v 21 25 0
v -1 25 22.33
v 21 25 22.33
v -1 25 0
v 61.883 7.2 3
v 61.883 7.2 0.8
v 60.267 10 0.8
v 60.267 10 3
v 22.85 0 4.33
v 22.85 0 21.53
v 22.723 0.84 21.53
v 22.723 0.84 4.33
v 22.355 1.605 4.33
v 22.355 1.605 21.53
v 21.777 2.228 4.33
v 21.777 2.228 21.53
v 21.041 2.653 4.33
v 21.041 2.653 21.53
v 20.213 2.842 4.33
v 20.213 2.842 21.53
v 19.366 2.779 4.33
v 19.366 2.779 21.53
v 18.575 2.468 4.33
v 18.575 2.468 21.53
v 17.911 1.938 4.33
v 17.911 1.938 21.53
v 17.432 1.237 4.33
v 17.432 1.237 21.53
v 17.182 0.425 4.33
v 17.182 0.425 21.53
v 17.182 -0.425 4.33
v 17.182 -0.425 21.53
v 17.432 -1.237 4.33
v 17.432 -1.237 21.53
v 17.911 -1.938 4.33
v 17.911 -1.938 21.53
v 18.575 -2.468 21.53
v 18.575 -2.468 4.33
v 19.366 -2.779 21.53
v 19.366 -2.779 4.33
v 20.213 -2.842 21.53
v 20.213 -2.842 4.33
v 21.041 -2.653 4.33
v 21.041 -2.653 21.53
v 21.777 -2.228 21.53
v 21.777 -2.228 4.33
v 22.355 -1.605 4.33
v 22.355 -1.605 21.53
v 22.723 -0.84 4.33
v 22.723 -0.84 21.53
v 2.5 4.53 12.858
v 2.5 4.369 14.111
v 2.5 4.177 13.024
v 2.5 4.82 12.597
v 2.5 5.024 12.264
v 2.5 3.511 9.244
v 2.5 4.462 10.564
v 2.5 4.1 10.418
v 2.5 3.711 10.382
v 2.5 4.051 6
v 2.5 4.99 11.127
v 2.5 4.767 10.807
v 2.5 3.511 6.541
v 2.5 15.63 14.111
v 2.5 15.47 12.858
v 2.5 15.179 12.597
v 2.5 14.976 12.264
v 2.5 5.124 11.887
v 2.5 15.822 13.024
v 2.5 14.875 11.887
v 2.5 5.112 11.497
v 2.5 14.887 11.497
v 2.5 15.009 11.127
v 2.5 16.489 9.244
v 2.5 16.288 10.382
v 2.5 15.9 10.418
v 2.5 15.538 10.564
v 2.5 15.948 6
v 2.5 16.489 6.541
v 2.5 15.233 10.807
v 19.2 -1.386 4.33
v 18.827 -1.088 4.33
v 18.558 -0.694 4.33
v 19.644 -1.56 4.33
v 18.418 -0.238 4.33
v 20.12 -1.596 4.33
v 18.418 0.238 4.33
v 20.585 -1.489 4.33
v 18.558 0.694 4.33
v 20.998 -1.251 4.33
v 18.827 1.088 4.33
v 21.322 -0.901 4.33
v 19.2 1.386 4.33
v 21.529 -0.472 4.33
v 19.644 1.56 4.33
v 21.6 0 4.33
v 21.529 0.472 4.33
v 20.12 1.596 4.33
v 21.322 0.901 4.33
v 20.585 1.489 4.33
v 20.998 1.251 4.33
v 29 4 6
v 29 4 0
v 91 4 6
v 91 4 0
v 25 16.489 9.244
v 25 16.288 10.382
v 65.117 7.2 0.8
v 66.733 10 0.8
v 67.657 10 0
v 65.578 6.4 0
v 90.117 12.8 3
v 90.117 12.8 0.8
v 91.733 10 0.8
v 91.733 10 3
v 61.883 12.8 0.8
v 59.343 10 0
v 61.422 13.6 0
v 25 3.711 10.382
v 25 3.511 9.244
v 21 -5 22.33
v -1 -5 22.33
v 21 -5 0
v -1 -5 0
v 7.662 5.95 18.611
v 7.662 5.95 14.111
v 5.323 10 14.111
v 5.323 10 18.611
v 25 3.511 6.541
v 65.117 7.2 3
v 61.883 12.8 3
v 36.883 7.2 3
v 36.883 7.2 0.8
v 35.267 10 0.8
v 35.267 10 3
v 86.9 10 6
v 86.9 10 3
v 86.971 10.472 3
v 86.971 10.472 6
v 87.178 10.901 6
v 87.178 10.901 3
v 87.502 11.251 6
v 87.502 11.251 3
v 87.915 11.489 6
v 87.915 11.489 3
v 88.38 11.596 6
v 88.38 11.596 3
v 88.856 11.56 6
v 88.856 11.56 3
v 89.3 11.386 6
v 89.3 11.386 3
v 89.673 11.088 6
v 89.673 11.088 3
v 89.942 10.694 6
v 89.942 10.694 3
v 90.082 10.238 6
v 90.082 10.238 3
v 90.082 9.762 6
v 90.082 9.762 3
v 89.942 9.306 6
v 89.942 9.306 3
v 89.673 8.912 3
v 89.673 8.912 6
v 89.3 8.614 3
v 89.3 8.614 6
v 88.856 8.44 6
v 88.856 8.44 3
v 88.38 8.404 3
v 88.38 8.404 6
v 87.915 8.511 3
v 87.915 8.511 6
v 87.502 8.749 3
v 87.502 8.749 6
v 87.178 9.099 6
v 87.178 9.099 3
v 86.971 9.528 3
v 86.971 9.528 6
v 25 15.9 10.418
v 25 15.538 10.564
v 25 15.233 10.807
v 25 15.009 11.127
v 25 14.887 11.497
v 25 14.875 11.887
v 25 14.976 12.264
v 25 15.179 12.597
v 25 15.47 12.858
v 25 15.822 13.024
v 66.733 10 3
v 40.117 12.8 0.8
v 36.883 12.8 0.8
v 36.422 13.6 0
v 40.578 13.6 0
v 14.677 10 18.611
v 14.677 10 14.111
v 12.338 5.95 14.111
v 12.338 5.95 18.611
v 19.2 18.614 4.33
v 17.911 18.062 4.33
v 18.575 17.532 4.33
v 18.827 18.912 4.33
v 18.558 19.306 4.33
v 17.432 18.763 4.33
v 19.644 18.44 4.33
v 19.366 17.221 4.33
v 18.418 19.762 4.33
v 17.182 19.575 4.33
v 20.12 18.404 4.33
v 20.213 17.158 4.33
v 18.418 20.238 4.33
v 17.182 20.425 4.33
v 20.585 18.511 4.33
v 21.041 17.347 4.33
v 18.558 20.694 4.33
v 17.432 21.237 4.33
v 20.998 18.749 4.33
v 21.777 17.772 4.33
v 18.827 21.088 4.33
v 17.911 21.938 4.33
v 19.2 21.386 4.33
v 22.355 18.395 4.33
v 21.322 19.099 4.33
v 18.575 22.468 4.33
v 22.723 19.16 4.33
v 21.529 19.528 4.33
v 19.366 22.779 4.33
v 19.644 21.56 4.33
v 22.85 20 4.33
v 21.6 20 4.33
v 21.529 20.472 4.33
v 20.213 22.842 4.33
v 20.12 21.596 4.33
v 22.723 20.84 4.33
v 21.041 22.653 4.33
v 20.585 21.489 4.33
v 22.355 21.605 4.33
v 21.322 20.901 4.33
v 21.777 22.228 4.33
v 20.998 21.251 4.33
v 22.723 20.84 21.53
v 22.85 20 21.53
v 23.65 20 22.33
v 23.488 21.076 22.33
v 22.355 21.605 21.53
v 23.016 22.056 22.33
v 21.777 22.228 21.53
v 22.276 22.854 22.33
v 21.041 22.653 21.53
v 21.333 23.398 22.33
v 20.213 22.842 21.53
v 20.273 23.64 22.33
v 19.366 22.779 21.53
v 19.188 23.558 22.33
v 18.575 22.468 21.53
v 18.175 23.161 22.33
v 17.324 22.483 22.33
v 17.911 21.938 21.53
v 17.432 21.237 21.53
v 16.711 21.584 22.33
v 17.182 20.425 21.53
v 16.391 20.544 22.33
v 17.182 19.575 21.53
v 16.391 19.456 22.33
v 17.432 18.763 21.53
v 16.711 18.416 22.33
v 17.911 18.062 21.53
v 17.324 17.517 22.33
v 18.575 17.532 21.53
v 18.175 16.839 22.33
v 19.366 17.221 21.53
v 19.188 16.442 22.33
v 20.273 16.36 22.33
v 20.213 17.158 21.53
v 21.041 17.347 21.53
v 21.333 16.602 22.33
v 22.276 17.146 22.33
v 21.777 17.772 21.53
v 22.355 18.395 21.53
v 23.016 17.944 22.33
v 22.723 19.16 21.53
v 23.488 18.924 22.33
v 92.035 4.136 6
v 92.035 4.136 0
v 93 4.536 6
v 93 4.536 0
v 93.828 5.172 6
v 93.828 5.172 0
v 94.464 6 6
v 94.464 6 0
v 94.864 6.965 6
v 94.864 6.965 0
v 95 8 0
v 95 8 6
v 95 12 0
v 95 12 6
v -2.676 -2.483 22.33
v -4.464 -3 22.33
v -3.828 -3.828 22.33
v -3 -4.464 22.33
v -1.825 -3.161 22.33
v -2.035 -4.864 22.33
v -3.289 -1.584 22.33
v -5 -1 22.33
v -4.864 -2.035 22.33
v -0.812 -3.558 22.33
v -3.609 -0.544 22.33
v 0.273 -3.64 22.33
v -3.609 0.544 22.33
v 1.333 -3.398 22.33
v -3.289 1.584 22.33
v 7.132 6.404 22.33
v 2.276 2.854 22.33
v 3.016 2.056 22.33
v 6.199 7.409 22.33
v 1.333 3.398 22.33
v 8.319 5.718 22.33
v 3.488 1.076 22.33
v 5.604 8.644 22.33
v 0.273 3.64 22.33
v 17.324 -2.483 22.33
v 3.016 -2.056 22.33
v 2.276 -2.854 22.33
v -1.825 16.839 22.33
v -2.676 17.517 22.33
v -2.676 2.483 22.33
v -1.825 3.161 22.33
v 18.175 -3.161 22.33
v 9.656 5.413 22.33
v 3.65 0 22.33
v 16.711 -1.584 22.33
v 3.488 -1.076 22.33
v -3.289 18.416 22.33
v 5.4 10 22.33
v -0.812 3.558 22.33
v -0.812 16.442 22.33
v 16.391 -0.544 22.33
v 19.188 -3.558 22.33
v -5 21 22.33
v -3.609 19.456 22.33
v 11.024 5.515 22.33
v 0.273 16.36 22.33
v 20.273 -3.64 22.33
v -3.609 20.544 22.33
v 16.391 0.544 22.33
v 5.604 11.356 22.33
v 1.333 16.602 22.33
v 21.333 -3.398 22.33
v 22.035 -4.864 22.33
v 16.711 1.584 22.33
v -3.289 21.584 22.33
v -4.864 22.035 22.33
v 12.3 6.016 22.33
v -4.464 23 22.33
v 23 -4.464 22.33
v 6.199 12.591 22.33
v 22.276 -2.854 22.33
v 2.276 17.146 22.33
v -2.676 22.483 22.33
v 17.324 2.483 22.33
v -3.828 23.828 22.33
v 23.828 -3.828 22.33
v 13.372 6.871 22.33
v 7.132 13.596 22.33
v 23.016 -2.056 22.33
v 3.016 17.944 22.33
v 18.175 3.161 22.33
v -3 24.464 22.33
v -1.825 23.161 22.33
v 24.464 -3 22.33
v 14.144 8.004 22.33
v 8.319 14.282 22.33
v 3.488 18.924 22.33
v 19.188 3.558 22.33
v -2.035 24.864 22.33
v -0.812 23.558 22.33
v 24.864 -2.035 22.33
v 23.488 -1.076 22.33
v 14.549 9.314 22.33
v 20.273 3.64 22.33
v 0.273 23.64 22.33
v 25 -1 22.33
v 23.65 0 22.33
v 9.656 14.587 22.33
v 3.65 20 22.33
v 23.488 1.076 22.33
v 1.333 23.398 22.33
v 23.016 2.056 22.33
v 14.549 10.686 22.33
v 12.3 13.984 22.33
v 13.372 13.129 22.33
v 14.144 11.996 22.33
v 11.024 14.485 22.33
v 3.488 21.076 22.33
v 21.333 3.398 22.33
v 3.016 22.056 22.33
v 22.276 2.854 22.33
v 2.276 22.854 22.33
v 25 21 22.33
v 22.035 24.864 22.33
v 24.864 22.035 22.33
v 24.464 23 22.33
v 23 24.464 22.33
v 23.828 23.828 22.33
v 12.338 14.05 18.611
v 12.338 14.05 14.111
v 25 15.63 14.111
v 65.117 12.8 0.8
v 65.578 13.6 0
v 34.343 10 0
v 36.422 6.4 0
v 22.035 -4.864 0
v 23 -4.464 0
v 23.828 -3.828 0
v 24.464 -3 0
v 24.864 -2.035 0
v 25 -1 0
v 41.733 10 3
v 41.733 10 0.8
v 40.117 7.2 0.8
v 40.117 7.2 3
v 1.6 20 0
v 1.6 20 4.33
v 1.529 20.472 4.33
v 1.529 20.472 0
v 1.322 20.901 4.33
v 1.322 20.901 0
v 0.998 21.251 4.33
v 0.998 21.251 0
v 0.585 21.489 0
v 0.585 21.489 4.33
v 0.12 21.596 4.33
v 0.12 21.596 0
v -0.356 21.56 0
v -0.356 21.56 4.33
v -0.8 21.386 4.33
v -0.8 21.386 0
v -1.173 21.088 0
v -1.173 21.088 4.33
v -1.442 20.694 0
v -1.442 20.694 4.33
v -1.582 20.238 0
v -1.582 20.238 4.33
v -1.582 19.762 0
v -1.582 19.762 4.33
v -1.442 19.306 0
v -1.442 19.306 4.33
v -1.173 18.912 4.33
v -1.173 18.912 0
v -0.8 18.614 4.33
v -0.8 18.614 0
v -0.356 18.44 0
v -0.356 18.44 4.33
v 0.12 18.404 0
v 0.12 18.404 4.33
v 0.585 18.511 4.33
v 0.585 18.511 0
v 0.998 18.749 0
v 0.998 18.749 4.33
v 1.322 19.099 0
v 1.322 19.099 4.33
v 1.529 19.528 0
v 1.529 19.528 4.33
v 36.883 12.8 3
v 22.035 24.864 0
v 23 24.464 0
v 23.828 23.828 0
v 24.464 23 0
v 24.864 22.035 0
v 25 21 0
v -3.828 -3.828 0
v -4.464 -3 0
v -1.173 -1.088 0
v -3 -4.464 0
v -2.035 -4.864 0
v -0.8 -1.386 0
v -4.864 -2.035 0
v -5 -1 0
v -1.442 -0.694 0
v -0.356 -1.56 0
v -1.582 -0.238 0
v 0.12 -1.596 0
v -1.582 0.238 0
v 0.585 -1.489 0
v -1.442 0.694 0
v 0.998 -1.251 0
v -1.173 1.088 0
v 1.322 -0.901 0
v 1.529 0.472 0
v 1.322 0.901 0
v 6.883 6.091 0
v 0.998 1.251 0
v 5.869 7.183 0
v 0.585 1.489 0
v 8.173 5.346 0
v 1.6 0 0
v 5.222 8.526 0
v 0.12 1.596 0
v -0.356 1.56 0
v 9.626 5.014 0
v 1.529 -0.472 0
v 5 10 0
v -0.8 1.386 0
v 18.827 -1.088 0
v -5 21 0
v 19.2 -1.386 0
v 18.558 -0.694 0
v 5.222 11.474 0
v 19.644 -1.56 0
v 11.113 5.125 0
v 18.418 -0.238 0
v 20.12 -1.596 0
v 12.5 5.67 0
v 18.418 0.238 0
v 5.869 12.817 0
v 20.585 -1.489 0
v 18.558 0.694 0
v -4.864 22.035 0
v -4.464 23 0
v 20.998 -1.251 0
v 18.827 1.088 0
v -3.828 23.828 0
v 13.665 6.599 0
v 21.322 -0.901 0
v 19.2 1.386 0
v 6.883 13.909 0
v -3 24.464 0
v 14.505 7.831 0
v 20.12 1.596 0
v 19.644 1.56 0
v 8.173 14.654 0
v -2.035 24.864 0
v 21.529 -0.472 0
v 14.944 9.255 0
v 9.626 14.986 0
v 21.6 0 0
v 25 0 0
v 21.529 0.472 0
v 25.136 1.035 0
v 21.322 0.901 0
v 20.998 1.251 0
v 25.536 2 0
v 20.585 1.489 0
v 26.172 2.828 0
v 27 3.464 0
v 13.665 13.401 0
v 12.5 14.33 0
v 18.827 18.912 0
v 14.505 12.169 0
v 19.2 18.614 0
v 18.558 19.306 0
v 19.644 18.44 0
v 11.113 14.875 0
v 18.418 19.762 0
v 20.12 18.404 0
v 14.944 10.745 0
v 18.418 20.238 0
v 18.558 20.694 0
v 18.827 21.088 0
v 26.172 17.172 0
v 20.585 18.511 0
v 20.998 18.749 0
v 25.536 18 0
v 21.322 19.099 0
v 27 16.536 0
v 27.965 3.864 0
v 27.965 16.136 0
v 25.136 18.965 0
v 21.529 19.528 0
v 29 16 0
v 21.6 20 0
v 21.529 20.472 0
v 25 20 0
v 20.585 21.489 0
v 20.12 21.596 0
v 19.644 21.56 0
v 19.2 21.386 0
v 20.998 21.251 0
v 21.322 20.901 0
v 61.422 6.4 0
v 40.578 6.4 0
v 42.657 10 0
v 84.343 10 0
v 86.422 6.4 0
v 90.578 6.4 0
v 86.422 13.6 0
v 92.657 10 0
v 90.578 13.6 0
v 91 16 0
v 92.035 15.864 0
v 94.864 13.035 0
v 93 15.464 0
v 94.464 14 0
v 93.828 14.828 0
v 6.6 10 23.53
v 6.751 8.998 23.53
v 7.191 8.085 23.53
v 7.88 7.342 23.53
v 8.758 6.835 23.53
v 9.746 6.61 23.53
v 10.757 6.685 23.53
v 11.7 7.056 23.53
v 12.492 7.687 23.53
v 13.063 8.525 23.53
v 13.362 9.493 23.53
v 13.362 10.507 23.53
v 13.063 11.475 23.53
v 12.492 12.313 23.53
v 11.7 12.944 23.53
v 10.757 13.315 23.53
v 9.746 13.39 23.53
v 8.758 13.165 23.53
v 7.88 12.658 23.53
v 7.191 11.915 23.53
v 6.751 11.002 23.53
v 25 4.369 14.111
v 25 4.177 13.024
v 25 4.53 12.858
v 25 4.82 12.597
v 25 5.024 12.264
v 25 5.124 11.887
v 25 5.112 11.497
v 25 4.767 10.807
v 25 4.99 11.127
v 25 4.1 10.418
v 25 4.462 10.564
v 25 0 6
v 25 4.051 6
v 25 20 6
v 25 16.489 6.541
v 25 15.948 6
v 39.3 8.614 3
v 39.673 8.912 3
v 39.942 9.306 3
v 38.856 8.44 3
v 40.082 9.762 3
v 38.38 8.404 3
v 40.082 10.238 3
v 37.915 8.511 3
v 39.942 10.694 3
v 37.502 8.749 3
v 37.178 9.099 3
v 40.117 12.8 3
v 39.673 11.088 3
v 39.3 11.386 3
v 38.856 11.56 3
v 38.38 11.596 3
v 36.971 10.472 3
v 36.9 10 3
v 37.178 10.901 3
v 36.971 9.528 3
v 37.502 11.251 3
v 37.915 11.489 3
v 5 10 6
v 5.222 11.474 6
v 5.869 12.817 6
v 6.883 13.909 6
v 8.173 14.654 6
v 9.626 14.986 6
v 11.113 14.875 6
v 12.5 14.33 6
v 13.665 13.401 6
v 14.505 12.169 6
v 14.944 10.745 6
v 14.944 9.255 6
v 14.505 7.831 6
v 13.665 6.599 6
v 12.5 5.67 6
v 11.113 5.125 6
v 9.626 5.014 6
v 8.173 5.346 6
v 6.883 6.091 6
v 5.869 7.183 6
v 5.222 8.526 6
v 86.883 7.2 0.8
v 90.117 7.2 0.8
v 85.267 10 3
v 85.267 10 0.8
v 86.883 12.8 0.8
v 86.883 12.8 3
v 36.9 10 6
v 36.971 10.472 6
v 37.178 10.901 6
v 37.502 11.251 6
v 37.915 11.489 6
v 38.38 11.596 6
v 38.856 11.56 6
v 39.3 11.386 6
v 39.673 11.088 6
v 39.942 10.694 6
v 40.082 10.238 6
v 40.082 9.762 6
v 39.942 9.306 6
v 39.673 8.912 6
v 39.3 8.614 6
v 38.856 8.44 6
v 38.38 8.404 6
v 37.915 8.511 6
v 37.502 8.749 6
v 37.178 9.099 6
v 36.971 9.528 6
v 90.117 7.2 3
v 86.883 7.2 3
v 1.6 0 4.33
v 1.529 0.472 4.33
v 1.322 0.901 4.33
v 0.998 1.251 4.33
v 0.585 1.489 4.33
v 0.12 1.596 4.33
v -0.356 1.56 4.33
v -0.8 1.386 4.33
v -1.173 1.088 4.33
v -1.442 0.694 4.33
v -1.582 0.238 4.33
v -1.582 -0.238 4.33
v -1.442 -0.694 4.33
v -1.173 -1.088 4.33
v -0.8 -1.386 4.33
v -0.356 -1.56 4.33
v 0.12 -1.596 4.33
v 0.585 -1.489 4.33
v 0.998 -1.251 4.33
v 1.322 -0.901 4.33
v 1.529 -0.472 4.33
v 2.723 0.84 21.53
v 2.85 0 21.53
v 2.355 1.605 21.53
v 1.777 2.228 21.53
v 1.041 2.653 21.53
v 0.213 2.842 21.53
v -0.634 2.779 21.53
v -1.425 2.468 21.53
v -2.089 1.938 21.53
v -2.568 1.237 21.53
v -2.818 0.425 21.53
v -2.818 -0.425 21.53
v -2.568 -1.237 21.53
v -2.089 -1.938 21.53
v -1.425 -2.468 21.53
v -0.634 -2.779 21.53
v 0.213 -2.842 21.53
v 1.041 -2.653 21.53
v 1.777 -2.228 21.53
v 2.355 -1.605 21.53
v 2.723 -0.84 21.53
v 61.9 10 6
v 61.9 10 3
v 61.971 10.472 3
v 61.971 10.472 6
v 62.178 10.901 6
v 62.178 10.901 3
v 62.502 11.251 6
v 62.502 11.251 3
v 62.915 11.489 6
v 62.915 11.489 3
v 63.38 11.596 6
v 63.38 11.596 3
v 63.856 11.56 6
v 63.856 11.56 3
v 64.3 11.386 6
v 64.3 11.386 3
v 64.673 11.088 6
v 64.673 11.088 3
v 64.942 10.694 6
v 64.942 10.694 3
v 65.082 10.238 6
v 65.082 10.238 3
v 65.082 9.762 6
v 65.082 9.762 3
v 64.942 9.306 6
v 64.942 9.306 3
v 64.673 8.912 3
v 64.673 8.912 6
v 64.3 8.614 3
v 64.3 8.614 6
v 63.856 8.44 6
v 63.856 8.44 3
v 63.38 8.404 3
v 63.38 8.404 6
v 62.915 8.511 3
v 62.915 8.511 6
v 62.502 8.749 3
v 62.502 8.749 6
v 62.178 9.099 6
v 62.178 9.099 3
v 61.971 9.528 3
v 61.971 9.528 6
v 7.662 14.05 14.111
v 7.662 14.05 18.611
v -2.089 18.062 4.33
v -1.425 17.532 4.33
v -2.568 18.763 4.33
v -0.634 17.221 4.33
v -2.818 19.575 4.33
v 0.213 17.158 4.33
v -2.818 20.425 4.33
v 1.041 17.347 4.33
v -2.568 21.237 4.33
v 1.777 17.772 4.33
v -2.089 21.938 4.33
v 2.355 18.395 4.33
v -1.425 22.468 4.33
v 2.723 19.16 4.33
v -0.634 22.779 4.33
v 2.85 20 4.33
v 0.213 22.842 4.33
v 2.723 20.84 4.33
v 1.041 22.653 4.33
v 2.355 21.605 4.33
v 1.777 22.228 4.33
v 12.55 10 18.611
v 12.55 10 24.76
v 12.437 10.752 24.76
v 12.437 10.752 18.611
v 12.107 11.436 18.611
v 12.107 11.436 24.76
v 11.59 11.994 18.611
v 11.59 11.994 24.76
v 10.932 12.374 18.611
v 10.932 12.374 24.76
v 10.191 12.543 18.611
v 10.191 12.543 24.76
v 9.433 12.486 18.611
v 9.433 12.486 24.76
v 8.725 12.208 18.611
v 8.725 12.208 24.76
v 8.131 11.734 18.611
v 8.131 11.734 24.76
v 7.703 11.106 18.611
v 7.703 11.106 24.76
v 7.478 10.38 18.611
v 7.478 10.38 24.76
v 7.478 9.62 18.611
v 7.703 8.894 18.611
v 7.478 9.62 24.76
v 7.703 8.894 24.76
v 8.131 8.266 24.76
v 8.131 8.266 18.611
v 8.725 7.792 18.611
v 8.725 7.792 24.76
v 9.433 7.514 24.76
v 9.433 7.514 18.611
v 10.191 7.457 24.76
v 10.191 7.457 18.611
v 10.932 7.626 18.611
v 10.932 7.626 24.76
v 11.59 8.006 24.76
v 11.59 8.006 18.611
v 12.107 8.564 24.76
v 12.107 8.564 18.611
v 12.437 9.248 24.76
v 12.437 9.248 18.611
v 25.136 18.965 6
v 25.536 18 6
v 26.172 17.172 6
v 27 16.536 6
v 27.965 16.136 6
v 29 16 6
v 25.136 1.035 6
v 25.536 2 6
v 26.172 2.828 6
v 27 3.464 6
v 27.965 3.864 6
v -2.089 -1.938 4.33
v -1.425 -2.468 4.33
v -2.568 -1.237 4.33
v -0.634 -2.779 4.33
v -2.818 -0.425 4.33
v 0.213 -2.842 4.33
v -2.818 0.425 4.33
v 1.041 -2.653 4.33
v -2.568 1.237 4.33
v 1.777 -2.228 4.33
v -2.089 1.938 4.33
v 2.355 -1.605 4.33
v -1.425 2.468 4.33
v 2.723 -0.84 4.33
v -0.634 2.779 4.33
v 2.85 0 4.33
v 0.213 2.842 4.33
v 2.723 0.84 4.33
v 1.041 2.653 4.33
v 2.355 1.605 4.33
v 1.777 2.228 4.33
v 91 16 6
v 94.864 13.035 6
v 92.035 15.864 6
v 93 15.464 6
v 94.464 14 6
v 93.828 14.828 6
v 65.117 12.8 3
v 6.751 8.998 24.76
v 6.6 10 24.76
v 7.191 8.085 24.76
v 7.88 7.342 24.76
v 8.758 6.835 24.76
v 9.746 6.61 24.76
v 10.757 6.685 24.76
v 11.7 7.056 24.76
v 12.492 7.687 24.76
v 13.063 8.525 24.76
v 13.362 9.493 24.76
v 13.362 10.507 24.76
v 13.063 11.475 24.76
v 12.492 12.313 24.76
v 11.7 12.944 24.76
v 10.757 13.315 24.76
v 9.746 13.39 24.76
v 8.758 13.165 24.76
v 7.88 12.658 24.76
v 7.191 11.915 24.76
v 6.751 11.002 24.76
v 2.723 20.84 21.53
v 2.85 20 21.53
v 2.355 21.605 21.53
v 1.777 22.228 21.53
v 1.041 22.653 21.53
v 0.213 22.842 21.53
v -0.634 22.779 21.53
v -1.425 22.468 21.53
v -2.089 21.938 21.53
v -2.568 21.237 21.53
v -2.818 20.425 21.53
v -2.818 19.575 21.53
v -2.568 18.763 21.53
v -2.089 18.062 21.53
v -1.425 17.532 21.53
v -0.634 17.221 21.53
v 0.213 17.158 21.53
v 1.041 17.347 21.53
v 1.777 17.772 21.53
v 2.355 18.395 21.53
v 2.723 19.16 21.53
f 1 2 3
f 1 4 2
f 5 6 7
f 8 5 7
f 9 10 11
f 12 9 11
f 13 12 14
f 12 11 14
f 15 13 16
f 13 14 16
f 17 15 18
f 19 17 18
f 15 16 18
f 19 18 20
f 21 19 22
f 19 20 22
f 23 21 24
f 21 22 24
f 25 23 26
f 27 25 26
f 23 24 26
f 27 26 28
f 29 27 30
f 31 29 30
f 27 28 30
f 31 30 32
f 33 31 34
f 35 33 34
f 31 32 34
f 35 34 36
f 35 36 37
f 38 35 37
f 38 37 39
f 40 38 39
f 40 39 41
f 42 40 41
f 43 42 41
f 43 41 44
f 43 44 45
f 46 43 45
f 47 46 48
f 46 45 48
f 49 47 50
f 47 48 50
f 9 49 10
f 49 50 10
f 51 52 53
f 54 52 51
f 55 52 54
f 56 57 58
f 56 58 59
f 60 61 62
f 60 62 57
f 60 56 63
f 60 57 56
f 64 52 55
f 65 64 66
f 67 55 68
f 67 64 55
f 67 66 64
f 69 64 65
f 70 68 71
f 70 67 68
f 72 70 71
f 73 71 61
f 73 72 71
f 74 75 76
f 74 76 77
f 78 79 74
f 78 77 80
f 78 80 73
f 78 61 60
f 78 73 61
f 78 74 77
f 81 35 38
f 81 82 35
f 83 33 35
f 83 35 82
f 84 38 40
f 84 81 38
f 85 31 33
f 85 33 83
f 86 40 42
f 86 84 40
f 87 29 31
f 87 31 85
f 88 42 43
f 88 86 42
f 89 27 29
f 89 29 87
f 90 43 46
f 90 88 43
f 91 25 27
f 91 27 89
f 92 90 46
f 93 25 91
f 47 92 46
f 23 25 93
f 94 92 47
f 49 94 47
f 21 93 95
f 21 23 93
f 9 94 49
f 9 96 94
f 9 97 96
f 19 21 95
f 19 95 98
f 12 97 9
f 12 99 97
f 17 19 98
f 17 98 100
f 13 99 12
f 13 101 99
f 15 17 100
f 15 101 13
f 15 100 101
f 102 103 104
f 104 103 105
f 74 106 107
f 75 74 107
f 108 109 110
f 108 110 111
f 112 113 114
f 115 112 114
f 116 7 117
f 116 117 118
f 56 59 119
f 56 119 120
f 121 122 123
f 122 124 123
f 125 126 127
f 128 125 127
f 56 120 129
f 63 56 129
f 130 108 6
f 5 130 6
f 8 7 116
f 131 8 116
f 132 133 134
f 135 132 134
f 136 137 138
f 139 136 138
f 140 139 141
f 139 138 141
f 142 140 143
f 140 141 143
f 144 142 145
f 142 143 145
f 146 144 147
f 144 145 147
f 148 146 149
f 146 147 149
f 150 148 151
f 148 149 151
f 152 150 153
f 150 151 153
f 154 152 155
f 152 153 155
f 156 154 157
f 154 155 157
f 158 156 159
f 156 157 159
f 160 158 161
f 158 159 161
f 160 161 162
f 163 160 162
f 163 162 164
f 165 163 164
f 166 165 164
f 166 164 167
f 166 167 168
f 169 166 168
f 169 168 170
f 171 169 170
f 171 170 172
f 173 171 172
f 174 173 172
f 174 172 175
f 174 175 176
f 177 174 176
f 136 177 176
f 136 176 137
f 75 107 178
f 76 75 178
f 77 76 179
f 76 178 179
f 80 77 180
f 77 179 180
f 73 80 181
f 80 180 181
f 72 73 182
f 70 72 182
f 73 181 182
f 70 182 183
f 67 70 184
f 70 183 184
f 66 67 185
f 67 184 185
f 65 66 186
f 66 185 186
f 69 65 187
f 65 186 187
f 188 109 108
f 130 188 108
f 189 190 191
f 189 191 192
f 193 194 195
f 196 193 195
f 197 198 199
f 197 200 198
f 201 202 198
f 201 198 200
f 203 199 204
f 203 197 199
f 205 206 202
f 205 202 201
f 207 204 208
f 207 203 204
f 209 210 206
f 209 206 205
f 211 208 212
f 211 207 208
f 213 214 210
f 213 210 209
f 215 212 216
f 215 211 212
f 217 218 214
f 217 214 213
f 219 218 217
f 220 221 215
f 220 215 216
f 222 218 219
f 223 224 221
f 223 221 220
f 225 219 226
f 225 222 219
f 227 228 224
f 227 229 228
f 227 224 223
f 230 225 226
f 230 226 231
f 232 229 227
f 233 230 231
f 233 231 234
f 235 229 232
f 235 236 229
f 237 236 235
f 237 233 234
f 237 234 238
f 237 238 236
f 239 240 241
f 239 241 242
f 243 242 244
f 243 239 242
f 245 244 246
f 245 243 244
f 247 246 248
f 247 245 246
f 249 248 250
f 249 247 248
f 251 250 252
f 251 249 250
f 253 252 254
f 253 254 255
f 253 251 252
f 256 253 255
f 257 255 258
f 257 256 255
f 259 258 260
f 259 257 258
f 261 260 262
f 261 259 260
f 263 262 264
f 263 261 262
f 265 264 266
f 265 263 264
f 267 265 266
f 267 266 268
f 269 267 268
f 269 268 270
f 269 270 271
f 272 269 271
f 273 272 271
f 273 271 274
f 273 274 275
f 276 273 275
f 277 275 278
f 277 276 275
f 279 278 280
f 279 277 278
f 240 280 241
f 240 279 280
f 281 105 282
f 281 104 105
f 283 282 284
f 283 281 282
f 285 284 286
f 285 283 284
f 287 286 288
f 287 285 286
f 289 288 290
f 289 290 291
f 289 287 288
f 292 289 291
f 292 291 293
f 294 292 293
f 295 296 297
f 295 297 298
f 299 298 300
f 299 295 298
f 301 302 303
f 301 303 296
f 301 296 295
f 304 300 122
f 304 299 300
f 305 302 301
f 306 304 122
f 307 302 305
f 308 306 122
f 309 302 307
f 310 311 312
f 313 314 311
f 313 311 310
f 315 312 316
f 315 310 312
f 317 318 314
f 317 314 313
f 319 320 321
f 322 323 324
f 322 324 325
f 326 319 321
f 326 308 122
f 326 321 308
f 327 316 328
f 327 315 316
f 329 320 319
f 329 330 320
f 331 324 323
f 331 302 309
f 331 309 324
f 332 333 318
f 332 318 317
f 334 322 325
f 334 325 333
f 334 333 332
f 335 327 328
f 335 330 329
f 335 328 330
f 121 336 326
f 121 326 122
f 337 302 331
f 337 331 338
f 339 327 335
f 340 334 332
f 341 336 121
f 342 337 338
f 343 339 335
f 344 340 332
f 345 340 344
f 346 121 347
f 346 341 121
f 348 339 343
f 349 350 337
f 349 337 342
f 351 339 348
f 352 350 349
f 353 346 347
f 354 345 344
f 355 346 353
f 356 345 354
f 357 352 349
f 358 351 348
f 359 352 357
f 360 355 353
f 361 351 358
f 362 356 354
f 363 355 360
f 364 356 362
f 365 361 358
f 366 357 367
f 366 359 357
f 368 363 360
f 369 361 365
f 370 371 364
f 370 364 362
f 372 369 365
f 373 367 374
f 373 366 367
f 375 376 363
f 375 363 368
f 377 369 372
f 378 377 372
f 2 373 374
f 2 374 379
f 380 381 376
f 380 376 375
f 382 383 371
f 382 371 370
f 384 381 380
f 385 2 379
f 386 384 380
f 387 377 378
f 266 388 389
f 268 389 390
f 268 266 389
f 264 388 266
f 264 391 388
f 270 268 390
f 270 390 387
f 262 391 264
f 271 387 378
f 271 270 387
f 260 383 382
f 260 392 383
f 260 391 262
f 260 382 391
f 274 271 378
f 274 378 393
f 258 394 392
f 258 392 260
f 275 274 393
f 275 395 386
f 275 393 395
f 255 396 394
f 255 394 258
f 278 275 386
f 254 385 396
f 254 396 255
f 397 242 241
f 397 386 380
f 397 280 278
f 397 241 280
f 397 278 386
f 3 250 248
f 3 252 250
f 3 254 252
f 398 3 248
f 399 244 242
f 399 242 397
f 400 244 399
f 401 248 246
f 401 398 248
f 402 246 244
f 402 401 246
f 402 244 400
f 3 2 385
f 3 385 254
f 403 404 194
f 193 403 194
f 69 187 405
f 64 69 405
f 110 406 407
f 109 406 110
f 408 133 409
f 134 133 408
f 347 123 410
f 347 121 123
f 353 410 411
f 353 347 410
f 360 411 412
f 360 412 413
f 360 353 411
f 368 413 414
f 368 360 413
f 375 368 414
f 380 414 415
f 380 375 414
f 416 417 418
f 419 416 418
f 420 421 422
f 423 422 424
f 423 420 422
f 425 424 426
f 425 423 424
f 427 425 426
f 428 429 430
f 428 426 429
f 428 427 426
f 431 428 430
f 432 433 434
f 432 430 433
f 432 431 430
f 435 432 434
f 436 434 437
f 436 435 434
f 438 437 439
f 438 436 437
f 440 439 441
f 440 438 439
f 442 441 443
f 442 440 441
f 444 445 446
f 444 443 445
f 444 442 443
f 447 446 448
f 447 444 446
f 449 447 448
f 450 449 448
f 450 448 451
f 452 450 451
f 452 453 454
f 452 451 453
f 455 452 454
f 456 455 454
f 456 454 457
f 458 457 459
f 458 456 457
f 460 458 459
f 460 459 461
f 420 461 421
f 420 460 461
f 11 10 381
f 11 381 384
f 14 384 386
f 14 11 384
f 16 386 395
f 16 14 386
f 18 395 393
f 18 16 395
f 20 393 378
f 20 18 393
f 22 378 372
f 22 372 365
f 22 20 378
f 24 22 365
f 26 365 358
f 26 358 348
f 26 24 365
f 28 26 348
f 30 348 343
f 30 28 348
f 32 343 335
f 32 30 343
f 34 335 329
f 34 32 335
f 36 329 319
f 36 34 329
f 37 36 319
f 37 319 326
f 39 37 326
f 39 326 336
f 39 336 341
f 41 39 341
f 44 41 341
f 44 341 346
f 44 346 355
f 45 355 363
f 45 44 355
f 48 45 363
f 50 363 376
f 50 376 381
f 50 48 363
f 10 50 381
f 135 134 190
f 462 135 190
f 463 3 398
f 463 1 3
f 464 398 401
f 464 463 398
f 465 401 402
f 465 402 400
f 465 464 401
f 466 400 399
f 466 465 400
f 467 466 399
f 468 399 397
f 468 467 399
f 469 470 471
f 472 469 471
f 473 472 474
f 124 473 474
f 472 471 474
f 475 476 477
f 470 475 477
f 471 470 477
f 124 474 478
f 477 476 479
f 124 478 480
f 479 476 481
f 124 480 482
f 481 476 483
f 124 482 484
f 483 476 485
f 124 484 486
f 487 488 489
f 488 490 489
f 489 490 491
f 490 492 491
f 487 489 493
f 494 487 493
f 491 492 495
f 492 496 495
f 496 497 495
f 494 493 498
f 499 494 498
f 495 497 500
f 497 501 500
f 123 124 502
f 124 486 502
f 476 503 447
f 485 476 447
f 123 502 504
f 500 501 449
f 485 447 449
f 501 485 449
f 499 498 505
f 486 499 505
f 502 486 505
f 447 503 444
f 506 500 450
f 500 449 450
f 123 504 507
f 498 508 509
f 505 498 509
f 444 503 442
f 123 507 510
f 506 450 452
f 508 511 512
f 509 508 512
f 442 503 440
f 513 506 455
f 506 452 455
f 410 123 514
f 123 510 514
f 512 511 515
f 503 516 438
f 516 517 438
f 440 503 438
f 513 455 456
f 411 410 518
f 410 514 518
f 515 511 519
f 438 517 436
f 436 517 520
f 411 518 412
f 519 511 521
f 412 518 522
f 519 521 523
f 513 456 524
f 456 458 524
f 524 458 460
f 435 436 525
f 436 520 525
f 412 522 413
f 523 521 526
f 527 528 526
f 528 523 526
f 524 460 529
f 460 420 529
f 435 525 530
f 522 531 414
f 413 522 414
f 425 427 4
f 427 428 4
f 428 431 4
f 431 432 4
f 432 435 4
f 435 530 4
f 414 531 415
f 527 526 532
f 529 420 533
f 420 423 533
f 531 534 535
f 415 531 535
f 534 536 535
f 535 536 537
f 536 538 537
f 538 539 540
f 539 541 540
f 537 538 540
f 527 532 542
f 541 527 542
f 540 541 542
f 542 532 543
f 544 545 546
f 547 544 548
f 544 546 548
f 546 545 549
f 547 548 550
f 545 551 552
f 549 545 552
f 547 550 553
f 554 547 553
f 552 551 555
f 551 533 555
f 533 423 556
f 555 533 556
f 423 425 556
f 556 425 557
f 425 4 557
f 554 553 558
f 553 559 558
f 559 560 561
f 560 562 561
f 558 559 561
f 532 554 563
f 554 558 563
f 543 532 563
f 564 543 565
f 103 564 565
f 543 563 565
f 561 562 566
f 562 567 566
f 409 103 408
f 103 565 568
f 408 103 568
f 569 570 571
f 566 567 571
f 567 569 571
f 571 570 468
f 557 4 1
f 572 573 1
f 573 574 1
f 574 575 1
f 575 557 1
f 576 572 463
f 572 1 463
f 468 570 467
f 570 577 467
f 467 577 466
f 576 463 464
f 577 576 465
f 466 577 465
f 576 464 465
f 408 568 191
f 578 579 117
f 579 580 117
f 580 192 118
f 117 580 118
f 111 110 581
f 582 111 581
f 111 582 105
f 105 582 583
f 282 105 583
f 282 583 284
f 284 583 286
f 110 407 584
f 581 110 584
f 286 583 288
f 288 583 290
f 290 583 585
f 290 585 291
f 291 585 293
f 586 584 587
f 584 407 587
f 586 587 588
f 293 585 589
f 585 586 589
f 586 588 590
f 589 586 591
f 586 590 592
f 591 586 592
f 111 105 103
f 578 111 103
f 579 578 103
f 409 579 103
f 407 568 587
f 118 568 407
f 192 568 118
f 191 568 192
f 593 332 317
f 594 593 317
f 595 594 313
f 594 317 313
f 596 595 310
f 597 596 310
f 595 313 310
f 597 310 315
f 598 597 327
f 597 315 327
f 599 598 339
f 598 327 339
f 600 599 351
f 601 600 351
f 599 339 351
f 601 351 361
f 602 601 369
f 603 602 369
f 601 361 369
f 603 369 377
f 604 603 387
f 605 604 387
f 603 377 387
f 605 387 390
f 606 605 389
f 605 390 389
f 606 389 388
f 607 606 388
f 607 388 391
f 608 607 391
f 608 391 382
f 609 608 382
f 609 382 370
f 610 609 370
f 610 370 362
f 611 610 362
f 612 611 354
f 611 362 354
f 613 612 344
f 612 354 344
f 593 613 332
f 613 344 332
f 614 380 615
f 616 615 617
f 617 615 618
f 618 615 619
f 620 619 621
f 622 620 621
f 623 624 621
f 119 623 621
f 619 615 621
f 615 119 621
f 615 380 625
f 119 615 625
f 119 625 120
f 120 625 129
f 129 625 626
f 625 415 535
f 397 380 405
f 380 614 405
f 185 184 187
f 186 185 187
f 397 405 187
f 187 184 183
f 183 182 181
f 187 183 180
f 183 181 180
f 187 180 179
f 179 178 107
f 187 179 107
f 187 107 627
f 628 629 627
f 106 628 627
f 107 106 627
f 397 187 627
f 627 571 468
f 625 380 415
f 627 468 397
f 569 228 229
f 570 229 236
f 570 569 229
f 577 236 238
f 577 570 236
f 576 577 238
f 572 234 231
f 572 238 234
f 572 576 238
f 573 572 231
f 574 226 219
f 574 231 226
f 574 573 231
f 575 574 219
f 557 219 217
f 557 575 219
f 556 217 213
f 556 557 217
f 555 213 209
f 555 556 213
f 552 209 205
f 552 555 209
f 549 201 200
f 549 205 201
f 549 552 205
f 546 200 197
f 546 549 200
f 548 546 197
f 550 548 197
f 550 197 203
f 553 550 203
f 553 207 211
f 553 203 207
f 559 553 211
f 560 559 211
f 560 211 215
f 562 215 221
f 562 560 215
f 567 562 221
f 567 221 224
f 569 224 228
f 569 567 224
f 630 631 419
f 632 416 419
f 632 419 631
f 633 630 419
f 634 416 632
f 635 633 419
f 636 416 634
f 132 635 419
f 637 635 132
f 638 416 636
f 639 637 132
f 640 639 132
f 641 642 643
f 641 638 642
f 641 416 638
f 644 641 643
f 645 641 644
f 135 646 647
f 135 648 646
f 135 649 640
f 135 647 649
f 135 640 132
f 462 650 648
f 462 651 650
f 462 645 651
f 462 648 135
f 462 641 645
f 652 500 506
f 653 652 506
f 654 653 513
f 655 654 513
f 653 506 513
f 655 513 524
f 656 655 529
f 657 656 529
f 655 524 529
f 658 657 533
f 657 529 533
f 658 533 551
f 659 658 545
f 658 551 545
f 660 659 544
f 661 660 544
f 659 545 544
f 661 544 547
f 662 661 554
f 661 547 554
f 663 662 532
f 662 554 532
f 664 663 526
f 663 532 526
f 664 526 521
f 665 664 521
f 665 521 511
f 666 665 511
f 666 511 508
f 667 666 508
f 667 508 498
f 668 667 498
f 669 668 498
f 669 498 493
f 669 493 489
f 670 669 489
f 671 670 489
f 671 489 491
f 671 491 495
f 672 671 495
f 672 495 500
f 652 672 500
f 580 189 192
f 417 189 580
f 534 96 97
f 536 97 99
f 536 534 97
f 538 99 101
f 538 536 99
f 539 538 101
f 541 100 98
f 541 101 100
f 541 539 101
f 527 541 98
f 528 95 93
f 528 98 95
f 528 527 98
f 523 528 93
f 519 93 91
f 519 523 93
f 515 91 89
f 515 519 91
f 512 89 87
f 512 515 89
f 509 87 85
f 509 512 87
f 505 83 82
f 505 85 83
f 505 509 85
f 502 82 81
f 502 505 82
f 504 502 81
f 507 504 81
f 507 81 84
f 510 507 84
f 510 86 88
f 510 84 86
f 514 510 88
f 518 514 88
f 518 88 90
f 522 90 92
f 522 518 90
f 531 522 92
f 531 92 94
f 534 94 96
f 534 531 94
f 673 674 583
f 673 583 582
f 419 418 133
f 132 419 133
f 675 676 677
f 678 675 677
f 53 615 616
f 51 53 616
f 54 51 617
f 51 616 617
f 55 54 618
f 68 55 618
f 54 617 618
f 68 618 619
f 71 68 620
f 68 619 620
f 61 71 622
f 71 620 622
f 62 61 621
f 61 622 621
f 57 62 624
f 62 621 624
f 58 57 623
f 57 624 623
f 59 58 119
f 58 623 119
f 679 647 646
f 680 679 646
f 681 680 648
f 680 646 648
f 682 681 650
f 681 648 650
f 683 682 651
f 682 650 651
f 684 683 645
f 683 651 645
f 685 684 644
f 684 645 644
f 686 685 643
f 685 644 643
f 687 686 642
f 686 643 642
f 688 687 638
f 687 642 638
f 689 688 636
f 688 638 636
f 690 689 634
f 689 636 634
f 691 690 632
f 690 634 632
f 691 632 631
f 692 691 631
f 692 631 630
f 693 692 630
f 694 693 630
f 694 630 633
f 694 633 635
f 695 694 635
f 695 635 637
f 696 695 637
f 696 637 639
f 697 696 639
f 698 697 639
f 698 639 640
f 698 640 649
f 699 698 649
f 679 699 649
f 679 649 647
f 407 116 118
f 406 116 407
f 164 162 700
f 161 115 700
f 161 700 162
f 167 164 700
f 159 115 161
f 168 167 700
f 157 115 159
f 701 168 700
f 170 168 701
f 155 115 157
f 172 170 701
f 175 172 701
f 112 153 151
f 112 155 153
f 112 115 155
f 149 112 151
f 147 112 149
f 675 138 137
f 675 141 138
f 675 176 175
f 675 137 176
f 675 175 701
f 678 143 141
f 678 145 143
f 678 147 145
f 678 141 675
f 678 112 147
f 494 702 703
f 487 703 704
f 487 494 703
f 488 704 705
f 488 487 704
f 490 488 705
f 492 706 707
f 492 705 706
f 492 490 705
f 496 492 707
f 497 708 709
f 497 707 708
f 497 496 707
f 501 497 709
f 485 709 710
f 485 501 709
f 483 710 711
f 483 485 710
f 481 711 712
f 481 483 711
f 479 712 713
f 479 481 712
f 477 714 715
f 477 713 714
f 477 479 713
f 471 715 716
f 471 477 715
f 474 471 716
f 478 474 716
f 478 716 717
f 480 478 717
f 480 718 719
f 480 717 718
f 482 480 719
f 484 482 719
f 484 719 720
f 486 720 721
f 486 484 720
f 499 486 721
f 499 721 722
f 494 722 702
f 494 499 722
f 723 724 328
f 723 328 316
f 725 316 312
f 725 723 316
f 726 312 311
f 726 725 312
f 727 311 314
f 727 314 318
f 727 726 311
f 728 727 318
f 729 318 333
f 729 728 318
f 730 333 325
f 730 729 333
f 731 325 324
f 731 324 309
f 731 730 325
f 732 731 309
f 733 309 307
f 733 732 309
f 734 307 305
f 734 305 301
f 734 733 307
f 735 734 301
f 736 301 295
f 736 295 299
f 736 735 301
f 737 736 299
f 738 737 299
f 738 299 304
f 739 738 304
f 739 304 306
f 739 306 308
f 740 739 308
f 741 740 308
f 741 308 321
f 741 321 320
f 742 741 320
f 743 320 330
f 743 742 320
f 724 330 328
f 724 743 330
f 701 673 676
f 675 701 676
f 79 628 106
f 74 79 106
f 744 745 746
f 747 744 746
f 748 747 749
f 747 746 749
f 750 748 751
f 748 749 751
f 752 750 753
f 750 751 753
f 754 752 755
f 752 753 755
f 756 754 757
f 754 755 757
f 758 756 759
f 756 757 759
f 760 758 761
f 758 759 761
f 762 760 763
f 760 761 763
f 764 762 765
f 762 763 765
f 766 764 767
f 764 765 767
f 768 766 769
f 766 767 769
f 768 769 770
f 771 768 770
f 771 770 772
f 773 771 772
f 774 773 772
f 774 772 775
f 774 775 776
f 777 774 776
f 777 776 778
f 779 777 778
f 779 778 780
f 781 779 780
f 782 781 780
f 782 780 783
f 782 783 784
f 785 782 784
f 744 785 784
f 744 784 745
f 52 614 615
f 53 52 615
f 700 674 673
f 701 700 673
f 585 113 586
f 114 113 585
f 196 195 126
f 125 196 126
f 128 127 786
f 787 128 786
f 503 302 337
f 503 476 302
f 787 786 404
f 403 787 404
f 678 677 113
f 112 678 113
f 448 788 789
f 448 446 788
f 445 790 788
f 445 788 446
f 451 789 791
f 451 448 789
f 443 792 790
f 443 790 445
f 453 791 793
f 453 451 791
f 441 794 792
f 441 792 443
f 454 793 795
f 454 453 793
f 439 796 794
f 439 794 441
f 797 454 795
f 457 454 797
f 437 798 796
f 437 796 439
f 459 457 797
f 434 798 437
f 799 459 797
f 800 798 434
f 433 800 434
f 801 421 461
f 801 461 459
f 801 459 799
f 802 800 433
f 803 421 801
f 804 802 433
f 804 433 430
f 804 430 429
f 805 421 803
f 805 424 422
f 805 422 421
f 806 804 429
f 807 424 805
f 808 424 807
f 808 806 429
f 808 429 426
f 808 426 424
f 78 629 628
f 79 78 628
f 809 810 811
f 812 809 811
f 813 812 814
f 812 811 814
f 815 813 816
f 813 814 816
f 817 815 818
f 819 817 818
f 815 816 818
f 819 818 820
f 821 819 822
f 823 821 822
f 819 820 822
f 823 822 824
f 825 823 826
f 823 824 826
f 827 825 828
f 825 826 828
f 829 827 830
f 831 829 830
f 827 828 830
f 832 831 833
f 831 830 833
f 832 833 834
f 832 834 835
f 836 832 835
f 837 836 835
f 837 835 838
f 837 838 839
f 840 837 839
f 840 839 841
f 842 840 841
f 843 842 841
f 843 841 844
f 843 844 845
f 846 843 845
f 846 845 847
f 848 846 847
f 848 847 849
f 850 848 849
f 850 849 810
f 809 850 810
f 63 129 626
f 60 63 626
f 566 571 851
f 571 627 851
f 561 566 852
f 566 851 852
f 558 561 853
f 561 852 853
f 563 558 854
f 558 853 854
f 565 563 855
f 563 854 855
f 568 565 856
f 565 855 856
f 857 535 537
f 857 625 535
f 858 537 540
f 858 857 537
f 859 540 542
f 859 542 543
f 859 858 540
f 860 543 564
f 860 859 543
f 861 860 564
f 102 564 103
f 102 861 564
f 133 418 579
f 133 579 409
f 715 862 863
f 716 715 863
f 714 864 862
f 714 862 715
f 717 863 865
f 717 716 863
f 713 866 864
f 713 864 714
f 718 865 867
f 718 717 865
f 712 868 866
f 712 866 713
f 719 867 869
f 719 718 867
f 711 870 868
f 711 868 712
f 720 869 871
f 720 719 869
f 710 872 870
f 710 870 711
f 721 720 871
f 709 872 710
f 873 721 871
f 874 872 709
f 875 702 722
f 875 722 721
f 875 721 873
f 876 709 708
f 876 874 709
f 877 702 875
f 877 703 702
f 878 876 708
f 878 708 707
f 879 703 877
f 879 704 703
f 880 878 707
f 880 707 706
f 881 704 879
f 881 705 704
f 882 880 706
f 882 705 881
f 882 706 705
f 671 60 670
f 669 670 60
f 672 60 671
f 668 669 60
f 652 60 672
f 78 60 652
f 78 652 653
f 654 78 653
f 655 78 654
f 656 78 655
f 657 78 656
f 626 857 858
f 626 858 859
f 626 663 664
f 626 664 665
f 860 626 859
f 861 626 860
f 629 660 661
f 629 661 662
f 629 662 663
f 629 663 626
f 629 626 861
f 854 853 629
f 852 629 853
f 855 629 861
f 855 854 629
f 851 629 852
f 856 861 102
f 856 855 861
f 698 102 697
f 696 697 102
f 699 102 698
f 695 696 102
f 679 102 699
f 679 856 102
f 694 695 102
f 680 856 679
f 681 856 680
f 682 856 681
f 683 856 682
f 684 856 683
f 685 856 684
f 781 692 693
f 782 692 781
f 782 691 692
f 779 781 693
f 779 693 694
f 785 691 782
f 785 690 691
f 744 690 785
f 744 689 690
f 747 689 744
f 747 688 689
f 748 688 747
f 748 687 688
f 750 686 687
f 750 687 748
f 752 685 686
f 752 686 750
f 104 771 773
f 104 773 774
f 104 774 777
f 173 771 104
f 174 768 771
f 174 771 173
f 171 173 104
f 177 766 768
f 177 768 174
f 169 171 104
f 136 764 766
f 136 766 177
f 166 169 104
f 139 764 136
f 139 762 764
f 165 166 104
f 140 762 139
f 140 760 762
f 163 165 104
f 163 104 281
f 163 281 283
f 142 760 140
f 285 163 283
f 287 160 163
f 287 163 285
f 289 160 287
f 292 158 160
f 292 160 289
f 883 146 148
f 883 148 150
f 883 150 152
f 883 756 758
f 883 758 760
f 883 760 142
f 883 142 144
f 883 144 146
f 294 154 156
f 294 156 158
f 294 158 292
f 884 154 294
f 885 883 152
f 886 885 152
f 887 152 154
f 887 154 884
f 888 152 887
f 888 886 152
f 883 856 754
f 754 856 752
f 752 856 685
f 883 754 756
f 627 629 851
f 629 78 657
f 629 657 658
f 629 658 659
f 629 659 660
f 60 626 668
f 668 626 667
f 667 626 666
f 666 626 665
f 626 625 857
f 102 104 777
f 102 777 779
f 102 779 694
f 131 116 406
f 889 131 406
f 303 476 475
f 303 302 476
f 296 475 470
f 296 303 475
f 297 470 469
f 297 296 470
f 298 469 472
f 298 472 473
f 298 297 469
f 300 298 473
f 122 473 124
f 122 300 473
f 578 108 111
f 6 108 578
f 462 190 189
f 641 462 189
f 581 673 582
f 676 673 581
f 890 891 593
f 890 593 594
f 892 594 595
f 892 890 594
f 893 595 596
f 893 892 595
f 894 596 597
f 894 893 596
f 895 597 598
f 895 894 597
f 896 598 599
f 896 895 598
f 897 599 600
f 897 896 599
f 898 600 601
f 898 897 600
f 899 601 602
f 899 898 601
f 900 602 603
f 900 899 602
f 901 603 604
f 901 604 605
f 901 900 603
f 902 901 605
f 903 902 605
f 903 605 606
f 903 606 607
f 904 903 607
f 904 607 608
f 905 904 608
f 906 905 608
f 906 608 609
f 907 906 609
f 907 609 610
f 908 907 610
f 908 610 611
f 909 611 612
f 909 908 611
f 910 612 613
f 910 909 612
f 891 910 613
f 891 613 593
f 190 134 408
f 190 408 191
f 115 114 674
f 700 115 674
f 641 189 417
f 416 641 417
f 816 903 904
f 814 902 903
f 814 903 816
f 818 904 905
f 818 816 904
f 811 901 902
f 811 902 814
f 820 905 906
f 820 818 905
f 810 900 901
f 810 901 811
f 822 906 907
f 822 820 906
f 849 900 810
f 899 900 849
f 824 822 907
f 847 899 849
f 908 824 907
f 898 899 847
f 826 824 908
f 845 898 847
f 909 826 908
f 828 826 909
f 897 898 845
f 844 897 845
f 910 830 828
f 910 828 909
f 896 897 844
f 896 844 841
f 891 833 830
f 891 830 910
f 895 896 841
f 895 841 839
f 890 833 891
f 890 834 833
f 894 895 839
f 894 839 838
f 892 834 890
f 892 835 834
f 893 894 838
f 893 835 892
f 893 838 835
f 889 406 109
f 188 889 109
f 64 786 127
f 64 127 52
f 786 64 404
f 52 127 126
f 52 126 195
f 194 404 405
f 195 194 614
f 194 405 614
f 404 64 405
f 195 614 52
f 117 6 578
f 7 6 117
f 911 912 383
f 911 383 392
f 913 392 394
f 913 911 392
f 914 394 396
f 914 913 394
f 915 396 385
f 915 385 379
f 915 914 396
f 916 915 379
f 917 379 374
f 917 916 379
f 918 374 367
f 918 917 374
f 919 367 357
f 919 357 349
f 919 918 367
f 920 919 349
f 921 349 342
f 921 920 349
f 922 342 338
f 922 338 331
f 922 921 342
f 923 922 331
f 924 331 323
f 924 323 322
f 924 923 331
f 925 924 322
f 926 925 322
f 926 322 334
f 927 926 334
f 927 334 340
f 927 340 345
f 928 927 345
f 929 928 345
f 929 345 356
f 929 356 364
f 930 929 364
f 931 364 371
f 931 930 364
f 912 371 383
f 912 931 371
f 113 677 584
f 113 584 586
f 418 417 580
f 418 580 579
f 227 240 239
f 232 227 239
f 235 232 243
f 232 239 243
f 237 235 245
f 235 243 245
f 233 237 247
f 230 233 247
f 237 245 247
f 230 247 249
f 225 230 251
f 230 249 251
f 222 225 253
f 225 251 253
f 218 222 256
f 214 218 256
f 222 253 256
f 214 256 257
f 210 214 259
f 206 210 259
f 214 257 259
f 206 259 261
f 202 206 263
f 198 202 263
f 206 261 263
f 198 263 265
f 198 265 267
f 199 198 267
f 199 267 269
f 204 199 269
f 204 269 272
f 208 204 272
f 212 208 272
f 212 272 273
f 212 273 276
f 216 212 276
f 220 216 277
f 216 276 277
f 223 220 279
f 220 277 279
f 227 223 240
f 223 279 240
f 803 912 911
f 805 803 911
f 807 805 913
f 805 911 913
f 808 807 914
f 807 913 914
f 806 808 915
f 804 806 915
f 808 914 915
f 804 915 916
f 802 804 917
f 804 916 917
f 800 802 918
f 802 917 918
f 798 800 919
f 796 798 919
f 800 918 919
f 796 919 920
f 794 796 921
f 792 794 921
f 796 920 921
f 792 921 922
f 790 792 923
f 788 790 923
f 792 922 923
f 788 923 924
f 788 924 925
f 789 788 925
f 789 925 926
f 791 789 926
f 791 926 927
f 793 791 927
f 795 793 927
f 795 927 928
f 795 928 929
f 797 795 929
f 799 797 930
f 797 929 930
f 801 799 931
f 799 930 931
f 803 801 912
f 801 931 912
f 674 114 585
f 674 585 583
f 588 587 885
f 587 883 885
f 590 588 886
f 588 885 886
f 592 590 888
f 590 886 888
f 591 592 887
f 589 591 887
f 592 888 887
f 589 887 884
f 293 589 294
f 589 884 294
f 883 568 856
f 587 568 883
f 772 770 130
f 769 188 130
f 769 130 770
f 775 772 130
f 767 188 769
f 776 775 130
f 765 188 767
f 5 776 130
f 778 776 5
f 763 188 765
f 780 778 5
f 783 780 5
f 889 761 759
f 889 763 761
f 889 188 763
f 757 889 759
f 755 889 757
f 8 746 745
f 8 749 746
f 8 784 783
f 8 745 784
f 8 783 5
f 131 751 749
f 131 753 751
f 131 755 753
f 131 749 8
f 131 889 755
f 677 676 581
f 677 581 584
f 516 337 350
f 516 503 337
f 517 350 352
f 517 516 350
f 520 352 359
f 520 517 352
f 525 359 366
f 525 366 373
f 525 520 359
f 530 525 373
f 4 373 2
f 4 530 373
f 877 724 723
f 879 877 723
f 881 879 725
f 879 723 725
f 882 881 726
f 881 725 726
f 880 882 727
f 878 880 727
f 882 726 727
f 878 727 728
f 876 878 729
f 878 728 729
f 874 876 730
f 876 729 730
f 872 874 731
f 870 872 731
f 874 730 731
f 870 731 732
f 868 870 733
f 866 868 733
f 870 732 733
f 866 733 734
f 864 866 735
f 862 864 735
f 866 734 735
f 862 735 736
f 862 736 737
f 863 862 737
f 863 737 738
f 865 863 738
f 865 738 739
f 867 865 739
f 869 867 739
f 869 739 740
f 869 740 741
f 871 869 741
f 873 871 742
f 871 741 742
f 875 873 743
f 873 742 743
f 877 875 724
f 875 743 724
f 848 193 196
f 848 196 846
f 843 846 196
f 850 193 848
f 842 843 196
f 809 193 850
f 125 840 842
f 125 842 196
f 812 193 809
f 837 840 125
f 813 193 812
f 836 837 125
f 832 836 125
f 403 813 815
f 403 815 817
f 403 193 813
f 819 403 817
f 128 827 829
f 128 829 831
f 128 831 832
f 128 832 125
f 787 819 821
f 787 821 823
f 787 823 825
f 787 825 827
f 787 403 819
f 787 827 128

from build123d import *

# Parameters (mm, degrees)
SKETCH1_R                  = 1.6
BOSS_EXTRUDE1_DEPTH        = 6
SKETCH1_3_R                = 1.6
BOSS_EXTRUDE2_DEPTH        = 22.33
CUT_EXTRUDE1_DEPTH         = 22.5
SKETCH3_R                  = 2.55
CUT_EXTRUDE2_DEPTH         = 8
CUT_EXTRUDE3_DEPTH         = 4.5
SKETCH6_R                  = 5
CUT_EXTRUDE5_DEPTH         = 8.6
SKETCH7_R                  = 1.6
CUT_EXTRUDE6_DEPTH         = 101.740403513
SKETCH8_R                  = 2.85
CUT_EXTRUDE7_DEPTH         = 18
BOSS_EXTRUDE3_START        = 2.43
SKETCH9_R                  = 3.4
SKETCH9_R_2                = 2.55
BOSS_EXTRUDE3_DEPTH        = 2.43
CHAMFER1_SIZE              = 1.2
FILLET3_R                  = 4
CHAMFER2_SIZE              = 0.8
CUT_EXTRUDE8_DEPTH         = 3
CHAMFER3_SIZE              = 0.8
LPATTERN1_COUNT            = 3
LPATTERN1_PITCH            = 25
CHAMFER3_OF_LPATTERN1_SIZE = 0.8


with BuildPart() as part:
    # Sketch1 → Boss-Extrude1 (new body)
    with BuildSketch(Plane.XY):
        Polygon((-5, 25), (-5, -5), (25, -5), (25, 4), (95, 4), (95, 16), (25, 16), (25, 25), align=None)
        Circle(SKETCH1_R, mode=Mode.SUBTRACT)
        with Locations((20, 0)):
            Circle(SKETCH1_R, mode=Mode.SUBTRACT)
        with Locations((0, 20)):
            Circle(SKETCH1_R, mode=Mode.SUBTRACT)
        with Locations((20, 20)):
            Circle(SKETCH1_R, mode=Mode.SUBTRACT)
    extrude(amount=BOSS_EXTRUDE1_DEPTH)

    # Sketch1<3> → Boss-Extrude2 (add)
    with BuildSketch(Plane.XY):
        Polygon((-5, 25), (-5, -5), (25, -5), (25, 4), (25, 16), (25, 25), align=None)
        Circle(SKETCH1_3_R, mode=Mode.SUBTRACT)
        with Locations((20, 0)):
            Circle(SKETCH1_3_R, mode=Mode.SUBTRACT)
        with Locations((0, 20)):
            Circle(SKETCH1_3_R, mode=Mode.SUBTRACT)
        with Locations((20, 20)):
            Circle(SKETCH1_3_R, mode=Mode.SUBTRACT)
    extrude(amount=BOSS_EXTRUDE2_DEPTH)

    # Sketch2 → Cut-Extrude1 (cut)
    with BuildSketch(Plane(origin=(25, 0, 0), x_dir=(0, 0, -1), z_dir=(1, 0, 0))):
        with BuildLine():
            Line((-6.54075, 16.488632043), (-9.2445, 16.488632043))
            Line((-9.2445, 16.488632043), (-10.381879417, 16.288081364))
            ThreePointArc((-10.381879417, 16.288081364), (-11.49719937, 14.886920062), (-13.024482689, 15.822119108))
            Line((-13.024482689, 15.822119108), (-14.11125, 15.630492709))
            Line((-14.11125, 15.630492709), (-14.11125, 4.368771376))
            Line((-14.11125, 4.368771376), (-13.024482689, 4.177144977))
            ThreePointArc((-13.024482689, 4.177144977), (-11.49719937, 5.112344024), (-10.381879417, 3.711182721))
            Line((-10.381879417, 3.711182721), (-9.2445, 3.510632043))
            Line((-9.2445, 3.510632043), (-6.54075, 3.510632043))
            Line((-6.54075, 3.510632043), (-6, 4.051382043))
            Line((-6, 4.051382043), (-6, 15.947882043))
            Line((-6, 15.947882043), (-6.54075, 16.488632043))
        make_face()
    extrude(amount=-CUT_EXTRUDE1_DEPTH, mode=Mode.SUBTRACT)

    # Sketch3 → Cut-Extrude2 (cut)
    with BuildSketch(Plane.XY.offset(22.33)):
        with Locations((10, 10)):
            Circle(SKETCH3_R)
    extrude(amount=-CUT_EXTRUDE2_DEPTH, mode=Mode.SUBTRACT)

    # Sketch5 → Cut-Extrude3 (cut)
    with BuildSketch(Plane(origin=(0, 0, 14.11125), x_dir=(-1, 0, 0), z_dir=(0, 0, -1))):
        Polygon((-5.32346282, 10), (-7.66173141, 14.05), (-12.33826859, 14.05), (-14.67653718, 10), (-12.33826859, 5.95), (-7.66173141, 5.95), align=None)
    extrude(amount=-CUT_EXTRUDE3_DEPTH, mode=Mode.SUBTRACT)

    # Sketch6 → Cut-Extrude5 (cut)
    with BuildSketch(Plane(origin=(0, 0, 0), x_dir=(-1, 0, 0), z_dir=(0, 0, -1))):
        with Locations((-10, 10)):
            Circle(SKETCH6_R)
    extrude(amount=-CUT_EXTRUDE5_DEPTH, mode=Mode.SUBTRACT)

    # Sketch7 → Cut-Extrude6 (cut, through all)
    with BuildSketch(Plane(origin=(0, 0, 0), x_dir=(-1, 0, 0), z_dir=(0, 0, -1))):
        with Locations((-88.5, 10)):
            Circle(SKETCH7_R)
        with Locations((-38.5, 10)):
            Circle(SKETCH7_R)
        with Locations((-63.5, 10)):
            Circle(SKETCH7_R)
    extrude(amount=-CUT_EXTRUDE6_DEPTH, mode=Mode.SUBTRACT)

    # Sketch8 → Cut-Extrude7 (cut)
    with BuildSketch(Plane.XY.offset(22.33)):
        with Locations((20, 20)):
            Circle(SKETCH8_R)
        with Locations((20, 0)):
            Circle(SKETCH8_R)
        Circle(SKETCH8_R)
        with Locations((0, 20)):
            Circle(SKETCH8_R)
    extrude(amount=-CUT_EXTRUDE7_DEPTH, mode=Mode.SUBTRACT)

    # Sketch9 → Boss-Extrude3 (add)
    with BuildSketch(Plane.XY.offset(22.33).offset(BOSS_EXTRUDE3_START)):
        with Locations((10, 10)):
            Circle(SKETCH9_R)
        with Locations((10, 10)):
            Circle(SKETCH9_R_2, mode=Mode.SUBTRACT)
    extrude(amount=-BOSS_EXTRUDE3_DEPTH)

    # Chamfer1
    chamfer1_edges = [part.edges().sort_by_distance(p)[0] for p in [
        (6.6, 10, 22.33),
    ]]
    chamfer(chamfer1_edges, length=CHAMFER1_SIZE)

    # Fillet3
    fillet3_edges = [part.edges().sort_by_distance(p)[0] for p in [
        (25, 4, 3),
        (25, 16, 3),
        (25, 25, 11.165),
        (-5, 25, 11.165),
        (-5, -5, 11.165),
        (25, -5, 11.165),
        (95, 4, 3),
        (95, 16, 3),
    ]]
    fillet(fillet3_edges, radius=FILLET3_R)

    # Chamfer2
    chamfer2_edges = [part.edges().sort_by_distance(p)[0] for p in [
        (17.15, 0, 22.33),
        (-2.85, 0, 22.33),
        (-2.85, 20, 22.33),
        (17.15, 20, 22.33),
    ]]
    chamfer(chamfer2_edges, length=CHAMFER2_SIZE)

    # Sketch10 → Cut-Extrude8 (cut)
    with BuildSketch(Plane(origin=(0, 0, 0), x_dir=(-1, 0, 0), z_dir=(0, 0, -1))):
        Polygon((-85.266838493, 10), (-86.883419246, 12.8), (-90.116580754, 12.8), (-91.733161507, 10), (-90.116580754, 7.2), (-86.883419246, 7.2), align=None)
    cut_extrude8 = extrude(amount=-CUT_EXTRUDE8_DEPTH, mode=Mode.SUBTRACT)

    # Chamfer3
    chamfer3_edges = [part.edges().sort_by_distance(p)[0] for p in [
        (86.075128869, 8.6, 0),
        (88.5, 7.2, 0),
        (90.924871131, 8.6, 0),
        (90.924871131, 11.4, 0),
        (86.075128869, 11.4, 0),
        (88.5, 12.8, 0),
    ]]
    chamfer(chamfer3_edges, length=CHAMFER3_SIZE)

    # LPattern1: Cut-Extrude8 ×3
    with Locations(*[(-i * LPATTERN1_PITCH, 0, 0) for i in range(1, LPATTERN1_COUNT)]):
        add(cut_extrude8, mode=Mode.SUBTRACT)

    # Chamfer3 of LPattern1
    chamfer3_of_lpattern1_edges = [part.edges().sort_by_distance(p)[0] for p in [
        (61.075128869, 8.6, 0),
        (63.5, 7.2, 0),
        (65.924871131, 8.6, 0),
        (65.924871131, 11.4, 0),
        (61.075128869, 11.4, 0),
        (63.5, 12.8, 0),
        (36.075128869, 8.6, 0),
        (38.5, 7.2, 0),
        (40.924871131, 8.6, 0),
        (40.924871131, 11.4, 0),
        (36.075128869, 11.4, 0),
        (38.5, 12.8, 0),
    ]]
    chamfer(chamfer3_of_lpattern1_edges, length=CHAMFER3_OF_LPATTERN1_SIZE)


solid = part.part
